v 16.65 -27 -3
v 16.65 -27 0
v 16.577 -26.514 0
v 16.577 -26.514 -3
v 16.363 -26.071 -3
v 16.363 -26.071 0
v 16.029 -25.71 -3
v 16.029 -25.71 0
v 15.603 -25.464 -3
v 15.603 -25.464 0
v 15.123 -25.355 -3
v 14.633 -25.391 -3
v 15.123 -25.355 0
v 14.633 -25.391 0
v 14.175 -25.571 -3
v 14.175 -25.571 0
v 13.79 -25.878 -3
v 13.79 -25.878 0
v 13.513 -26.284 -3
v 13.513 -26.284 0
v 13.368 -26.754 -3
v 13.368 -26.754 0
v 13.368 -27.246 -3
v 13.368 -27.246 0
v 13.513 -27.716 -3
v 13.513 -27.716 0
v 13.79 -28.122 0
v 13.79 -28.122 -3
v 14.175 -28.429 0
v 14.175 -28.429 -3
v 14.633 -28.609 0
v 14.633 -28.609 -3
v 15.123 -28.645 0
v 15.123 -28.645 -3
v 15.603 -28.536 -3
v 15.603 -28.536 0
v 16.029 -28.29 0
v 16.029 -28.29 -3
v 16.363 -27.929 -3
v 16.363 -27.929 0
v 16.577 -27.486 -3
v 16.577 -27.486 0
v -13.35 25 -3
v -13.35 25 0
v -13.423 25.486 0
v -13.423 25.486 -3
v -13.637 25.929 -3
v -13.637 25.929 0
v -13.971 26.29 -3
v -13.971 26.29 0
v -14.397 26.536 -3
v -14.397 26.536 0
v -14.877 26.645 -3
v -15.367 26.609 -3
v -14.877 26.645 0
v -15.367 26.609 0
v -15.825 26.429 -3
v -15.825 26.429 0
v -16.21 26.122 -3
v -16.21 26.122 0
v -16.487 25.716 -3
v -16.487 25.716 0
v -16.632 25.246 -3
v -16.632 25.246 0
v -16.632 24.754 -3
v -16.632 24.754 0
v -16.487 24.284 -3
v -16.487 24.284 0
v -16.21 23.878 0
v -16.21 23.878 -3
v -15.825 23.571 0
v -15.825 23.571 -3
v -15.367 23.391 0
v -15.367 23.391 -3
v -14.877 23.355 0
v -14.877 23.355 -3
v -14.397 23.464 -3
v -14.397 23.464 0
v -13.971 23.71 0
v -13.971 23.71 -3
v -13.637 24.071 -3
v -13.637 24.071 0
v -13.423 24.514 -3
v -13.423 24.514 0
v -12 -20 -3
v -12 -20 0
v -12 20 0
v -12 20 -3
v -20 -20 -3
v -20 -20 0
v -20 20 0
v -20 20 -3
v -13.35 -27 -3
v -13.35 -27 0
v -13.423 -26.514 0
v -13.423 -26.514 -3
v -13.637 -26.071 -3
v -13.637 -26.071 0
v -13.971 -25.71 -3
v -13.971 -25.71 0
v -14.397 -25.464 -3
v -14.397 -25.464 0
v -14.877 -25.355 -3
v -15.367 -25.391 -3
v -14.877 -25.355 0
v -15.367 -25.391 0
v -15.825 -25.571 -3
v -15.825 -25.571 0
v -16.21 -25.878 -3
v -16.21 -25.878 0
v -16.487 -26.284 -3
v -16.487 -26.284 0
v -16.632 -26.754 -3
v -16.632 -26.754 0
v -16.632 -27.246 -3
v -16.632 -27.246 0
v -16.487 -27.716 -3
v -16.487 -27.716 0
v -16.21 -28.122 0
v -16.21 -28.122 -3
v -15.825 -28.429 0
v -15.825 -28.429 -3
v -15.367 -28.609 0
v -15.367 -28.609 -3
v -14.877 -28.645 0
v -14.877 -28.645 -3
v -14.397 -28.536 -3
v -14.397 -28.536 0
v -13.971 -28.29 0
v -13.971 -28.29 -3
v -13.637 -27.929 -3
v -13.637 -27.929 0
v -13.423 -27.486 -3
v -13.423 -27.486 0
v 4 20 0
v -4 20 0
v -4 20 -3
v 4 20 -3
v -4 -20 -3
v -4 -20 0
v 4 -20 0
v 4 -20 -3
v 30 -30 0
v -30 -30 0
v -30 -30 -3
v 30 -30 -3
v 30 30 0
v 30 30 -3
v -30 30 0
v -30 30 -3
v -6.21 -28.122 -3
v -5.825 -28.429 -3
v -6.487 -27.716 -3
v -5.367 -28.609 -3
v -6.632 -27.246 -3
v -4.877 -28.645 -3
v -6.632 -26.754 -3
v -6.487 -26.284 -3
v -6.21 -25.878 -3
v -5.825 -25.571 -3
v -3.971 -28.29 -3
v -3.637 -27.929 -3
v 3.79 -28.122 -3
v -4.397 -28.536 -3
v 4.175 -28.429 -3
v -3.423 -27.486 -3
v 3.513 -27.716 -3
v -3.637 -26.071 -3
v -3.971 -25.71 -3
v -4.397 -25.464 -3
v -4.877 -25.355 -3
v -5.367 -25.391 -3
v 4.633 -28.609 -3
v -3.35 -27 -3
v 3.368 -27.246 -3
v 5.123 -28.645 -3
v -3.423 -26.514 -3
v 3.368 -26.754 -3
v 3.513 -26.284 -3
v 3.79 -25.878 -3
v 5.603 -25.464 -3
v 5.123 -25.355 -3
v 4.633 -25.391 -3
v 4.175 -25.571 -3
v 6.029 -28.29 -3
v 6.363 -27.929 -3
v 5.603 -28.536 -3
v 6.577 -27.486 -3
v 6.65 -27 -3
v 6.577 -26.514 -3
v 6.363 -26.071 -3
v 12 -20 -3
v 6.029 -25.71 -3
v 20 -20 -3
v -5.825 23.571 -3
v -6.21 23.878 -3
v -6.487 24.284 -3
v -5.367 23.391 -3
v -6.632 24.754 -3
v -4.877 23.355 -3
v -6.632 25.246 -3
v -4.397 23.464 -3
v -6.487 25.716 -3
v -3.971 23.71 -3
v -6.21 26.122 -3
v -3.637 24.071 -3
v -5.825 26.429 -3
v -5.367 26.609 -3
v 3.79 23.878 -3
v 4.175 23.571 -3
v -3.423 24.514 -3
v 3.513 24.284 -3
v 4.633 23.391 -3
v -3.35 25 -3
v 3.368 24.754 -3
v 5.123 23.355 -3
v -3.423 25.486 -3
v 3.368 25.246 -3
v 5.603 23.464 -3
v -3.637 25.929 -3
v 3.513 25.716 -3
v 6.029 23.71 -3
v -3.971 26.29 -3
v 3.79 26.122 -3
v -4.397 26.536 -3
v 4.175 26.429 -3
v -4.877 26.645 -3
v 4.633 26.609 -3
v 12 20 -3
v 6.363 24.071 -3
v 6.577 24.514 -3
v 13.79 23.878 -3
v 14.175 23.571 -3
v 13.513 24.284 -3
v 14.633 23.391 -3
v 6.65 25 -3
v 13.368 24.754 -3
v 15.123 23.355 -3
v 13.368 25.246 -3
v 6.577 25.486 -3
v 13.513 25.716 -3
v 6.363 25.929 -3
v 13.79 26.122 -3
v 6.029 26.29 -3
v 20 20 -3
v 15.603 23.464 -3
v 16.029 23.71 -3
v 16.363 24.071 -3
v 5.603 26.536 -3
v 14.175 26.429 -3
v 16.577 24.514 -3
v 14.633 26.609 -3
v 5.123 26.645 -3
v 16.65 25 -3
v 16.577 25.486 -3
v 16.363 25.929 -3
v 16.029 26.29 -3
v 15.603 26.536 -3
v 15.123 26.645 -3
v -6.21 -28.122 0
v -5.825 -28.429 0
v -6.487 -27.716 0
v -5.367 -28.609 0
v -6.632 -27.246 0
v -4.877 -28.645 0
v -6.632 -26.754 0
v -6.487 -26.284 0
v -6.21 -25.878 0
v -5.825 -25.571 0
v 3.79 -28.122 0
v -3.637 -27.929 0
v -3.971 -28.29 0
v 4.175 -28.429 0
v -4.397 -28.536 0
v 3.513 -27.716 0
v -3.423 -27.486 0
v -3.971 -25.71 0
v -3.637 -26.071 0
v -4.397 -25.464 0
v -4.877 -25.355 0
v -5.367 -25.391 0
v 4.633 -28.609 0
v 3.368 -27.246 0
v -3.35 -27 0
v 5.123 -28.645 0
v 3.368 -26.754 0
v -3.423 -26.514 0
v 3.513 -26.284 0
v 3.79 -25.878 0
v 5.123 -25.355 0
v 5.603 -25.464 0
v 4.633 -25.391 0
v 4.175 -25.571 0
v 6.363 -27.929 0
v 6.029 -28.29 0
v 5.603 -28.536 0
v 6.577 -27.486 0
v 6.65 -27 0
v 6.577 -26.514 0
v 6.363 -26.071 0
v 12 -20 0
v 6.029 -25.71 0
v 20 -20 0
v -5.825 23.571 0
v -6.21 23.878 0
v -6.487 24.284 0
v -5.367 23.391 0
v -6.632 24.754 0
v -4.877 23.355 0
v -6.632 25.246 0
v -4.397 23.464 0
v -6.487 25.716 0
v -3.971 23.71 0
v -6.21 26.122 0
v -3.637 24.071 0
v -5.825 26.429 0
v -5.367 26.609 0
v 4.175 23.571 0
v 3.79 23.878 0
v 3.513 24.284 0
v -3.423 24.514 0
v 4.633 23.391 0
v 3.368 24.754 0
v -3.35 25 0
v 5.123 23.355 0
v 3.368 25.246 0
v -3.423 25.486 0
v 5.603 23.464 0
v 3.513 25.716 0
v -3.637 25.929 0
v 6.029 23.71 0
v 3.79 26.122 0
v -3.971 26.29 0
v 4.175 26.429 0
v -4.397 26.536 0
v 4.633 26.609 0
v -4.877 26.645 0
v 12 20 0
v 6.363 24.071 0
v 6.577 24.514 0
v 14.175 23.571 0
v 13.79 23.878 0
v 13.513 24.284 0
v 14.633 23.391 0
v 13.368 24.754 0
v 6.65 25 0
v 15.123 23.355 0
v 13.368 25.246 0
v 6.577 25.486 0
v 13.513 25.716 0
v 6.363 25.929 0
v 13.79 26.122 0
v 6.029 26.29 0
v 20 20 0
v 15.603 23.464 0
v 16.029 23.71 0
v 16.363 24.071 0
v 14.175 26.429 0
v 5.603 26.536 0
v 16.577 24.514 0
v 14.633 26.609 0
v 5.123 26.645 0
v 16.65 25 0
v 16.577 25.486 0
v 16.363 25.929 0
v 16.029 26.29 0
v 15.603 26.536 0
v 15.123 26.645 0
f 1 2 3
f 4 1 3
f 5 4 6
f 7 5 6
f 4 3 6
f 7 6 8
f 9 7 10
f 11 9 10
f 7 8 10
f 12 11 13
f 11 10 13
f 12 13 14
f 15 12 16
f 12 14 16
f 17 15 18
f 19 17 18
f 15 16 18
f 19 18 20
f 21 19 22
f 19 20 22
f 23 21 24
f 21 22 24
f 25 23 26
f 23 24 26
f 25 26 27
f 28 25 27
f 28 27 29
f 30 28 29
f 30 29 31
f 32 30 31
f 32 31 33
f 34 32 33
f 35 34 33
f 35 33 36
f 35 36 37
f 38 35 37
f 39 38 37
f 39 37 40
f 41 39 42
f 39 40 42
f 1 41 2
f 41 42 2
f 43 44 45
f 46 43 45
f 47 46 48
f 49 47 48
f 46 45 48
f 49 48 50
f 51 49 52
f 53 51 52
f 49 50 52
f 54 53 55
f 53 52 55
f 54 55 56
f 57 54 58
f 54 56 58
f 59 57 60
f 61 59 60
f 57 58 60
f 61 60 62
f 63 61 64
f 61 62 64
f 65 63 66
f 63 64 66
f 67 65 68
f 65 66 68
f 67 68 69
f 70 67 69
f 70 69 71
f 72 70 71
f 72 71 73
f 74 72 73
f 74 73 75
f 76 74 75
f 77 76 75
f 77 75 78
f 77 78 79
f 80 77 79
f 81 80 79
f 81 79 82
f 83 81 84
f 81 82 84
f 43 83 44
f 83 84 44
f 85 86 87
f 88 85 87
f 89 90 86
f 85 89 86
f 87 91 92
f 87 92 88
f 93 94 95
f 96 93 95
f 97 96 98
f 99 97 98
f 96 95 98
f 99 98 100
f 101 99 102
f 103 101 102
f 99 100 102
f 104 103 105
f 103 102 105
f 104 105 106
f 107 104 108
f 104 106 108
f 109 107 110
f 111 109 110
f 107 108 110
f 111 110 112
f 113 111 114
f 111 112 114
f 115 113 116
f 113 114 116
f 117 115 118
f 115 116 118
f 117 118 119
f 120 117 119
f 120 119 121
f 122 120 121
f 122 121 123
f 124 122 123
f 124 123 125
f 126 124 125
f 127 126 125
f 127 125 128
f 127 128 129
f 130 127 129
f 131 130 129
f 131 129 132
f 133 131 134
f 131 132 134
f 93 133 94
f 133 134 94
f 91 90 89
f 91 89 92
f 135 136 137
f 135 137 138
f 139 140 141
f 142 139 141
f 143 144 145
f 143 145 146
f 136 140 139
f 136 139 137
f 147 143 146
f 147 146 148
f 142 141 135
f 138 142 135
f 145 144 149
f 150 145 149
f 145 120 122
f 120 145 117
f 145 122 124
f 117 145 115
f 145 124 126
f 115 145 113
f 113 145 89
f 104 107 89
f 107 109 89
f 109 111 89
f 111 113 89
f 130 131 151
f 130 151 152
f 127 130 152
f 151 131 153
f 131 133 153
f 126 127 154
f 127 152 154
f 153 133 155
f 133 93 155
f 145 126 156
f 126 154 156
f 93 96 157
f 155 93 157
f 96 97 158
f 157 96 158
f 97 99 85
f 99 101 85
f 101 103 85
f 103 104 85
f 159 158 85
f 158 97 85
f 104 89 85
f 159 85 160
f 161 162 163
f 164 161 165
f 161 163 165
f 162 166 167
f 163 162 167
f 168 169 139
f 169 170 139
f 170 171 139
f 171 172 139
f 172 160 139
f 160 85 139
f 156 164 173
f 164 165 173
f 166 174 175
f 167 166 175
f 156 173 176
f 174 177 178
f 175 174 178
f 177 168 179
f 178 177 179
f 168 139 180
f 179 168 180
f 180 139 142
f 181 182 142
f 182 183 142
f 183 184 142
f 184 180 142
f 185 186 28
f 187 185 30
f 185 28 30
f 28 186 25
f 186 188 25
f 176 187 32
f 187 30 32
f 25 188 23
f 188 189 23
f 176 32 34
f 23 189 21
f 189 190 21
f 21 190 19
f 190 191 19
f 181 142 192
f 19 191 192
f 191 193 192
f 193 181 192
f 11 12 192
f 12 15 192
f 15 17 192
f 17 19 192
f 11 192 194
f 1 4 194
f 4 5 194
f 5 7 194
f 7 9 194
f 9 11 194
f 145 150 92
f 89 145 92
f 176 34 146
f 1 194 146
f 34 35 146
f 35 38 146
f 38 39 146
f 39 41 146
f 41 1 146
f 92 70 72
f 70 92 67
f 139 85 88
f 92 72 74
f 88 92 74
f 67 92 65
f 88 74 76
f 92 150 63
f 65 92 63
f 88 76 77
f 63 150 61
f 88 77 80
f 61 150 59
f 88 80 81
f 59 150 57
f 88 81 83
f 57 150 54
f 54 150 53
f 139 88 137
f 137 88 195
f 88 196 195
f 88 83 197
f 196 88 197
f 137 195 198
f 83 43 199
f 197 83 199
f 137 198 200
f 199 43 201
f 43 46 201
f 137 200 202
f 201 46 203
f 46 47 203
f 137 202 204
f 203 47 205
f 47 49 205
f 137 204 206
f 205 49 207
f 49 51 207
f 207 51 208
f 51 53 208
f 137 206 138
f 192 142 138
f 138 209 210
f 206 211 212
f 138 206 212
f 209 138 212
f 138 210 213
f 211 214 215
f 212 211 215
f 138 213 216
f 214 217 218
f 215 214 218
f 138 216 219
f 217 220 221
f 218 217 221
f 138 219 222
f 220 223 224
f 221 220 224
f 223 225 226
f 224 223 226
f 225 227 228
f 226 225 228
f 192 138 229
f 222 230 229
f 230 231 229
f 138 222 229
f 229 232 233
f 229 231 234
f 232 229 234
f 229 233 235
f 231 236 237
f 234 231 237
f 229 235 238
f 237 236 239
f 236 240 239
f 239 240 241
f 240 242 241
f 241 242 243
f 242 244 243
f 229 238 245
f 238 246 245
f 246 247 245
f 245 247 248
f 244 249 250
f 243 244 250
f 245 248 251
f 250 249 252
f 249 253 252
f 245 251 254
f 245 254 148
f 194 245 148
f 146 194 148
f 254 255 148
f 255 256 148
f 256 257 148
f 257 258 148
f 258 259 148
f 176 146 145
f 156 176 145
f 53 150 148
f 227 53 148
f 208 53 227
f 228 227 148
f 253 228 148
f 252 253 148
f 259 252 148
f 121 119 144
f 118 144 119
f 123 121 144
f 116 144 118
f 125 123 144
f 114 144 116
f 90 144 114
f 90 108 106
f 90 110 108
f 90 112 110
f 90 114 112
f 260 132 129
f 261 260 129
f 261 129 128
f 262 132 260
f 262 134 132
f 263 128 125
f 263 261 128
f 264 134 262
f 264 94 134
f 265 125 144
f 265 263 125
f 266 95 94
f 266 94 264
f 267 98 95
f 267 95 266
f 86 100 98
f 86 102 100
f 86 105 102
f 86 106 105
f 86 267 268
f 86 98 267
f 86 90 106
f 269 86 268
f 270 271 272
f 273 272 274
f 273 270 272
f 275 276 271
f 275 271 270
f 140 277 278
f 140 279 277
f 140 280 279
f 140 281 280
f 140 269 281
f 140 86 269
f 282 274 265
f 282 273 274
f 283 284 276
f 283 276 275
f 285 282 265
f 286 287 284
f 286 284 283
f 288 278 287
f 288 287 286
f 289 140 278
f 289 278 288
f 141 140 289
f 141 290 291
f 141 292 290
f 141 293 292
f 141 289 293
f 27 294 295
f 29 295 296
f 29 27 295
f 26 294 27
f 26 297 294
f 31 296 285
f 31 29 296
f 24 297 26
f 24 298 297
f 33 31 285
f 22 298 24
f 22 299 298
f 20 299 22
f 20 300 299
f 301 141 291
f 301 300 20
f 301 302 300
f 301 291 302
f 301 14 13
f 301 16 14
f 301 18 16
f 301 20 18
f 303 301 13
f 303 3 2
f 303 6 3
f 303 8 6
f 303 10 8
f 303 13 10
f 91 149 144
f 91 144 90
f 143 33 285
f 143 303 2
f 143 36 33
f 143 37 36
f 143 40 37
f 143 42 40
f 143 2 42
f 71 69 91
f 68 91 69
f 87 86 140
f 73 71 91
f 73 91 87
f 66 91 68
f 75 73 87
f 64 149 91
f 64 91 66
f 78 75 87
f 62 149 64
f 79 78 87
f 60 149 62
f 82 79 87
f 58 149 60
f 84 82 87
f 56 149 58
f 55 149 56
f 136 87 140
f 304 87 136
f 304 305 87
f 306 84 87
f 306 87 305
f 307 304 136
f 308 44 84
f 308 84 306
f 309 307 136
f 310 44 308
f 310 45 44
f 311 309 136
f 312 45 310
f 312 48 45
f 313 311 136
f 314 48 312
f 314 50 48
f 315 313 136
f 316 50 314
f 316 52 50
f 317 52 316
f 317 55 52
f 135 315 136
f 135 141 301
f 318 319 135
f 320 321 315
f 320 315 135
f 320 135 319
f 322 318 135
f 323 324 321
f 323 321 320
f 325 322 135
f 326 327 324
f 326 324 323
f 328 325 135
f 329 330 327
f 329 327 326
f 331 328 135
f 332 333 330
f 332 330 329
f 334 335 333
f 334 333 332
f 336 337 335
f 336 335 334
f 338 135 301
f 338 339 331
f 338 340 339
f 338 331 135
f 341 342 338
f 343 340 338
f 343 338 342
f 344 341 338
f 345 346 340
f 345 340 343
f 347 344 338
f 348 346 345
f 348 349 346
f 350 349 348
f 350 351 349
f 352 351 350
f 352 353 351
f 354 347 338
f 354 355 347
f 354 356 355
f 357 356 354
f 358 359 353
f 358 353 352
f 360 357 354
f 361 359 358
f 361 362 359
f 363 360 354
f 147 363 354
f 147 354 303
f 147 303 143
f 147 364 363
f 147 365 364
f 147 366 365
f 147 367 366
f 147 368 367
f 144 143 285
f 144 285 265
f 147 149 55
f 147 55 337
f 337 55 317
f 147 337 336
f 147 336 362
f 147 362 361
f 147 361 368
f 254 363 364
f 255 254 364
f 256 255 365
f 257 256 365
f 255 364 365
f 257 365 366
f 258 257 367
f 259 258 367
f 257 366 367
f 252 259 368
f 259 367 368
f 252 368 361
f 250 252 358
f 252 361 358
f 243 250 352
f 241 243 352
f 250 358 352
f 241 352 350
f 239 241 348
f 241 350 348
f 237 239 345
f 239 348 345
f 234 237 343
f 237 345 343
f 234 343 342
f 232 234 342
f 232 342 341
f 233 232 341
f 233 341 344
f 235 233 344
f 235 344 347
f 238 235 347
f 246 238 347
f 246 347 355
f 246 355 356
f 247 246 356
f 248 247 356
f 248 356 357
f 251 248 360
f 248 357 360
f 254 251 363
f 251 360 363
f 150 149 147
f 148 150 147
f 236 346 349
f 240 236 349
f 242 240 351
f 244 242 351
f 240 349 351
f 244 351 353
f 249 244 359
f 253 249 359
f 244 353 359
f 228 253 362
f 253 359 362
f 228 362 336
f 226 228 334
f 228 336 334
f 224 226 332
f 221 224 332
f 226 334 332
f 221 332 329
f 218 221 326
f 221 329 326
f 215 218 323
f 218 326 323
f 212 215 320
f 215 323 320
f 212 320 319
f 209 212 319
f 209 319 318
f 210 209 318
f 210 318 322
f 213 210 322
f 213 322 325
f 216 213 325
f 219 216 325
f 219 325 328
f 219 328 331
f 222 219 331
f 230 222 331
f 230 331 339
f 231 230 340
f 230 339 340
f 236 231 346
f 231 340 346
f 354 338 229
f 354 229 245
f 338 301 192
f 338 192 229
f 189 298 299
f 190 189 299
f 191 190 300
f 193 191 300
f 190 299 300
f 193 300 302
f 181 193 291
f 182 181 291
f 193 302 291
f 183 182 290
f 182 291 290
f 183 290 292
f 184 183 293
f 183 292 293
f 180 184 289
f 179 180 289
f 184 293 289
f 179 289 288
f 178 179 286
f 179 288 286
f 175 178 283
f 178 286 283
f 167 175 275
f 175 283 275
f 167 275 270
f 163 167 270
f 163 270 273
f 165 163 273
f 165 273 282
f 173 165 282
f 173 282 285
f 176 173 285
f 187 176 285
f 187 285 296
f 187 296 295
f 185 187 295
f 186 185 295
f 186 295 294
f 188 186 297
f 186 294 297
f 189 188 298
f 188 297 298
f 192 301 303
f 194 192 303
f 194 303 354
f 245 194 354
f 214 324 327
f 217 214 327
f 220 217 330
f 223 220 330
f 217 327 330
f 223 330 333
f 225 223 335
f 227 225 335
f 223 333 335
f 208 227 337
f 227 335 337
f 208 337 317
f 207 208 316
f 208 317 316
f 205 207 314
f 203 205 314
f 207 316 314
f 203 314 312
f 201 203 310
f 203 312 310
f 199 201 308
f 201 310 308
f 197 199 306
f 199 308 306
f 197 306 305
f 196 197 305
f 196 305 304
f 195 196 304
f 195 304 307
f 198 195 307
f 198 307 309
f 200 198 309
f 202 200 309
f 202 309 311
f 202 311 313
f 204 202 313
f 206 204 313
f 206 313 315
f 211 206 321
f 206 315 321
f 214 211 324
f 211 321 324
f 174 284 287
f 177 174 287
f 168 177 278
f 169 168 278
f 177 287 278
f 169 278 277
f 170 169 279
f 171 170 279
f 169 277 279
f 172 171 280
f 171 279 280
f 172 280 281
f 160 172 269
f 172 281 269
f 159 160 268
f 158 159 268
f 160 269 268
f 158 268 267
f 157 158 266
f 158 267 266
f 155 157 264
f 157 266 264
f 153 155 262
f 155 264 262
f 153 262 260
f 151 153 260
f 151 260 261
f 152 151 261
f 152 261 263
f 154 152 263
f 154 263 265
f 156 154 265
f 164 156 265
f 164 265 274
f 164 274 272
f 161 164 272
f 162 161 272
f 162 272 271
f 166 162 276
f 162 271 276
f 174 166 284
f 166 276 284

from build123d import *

# Parameters (mm, degrees)
ESQUISSE1_W             = 60
ESQUISSE1_H             = 60
ESQUISSE1_R             = 1.65
BOSS_EXTRU_1_DEPTH      = 3
ESQUISSE2_W             = 8
ESQUISSE2_H             = 40
ENL_V_MAT_EXTRU_1_DEPTH = 3


with BuildPart() as part:
    # Esquisse1 → Boss.-Extru.1 (new body)
    with BuildSketch(Plane.XY):
        Rectangle(ESQUISSE1_W, ESQUISSE1_H)
        with Locations((-15, 25)):
            Circle(ESQUISSE1_R, mode=Mode.SUBTRACT)
        with Locations((5, 25)):
            Circle(ESQUISSE1_R, mode=Mode.SUBTRACT)
        with Locations((15, 25)):
            Circle(ESQUISSE1_R, mode=Mode.SUBTRACT)
        with Locations((-5, 25)):
            Circle(ESQUISSE1_R, mode=Mode.SUBTRACT)
        with Locations((-15, -27)):
            Circle(ESQUISSE1_R, mode=Mode.SUBTRACT)
        with Locations((-5, -27)):
            Circle(ESQUISSE1_R, mode=Mode.SUBTRACT)
        with Locations((5, -27)):
            Circle(ESQUISSE1_R, mode=Mode.SUBTRACT)
        with Locations((15, -27)):
            Circle(ESQUISSE1_R, mode=Mode.SUBTRACT)
    extrude(amount=-BOSS_EXTRU_1_DEPTH)

    # Esquisse2 → Enlèv. mat.-Extru.1 (cut)
    with BuildSketch(Plane.XY):
        with Locations((-16, 0)):
            Rectangle(ESQUISSE2_W, ESQUISSE2_H)
        Rectangle(ESQUISSE2_W, ESQUISSE2_H)
        with Locations((16, 0)):
            Rectangle(ESQUISSE2_W, ESQUISSE2_H)
    extrude(amount=-ENL_V_MAT_EXTRU_1_DEPTH, mode=Mode.SUBTRACT)


solid = part.part
